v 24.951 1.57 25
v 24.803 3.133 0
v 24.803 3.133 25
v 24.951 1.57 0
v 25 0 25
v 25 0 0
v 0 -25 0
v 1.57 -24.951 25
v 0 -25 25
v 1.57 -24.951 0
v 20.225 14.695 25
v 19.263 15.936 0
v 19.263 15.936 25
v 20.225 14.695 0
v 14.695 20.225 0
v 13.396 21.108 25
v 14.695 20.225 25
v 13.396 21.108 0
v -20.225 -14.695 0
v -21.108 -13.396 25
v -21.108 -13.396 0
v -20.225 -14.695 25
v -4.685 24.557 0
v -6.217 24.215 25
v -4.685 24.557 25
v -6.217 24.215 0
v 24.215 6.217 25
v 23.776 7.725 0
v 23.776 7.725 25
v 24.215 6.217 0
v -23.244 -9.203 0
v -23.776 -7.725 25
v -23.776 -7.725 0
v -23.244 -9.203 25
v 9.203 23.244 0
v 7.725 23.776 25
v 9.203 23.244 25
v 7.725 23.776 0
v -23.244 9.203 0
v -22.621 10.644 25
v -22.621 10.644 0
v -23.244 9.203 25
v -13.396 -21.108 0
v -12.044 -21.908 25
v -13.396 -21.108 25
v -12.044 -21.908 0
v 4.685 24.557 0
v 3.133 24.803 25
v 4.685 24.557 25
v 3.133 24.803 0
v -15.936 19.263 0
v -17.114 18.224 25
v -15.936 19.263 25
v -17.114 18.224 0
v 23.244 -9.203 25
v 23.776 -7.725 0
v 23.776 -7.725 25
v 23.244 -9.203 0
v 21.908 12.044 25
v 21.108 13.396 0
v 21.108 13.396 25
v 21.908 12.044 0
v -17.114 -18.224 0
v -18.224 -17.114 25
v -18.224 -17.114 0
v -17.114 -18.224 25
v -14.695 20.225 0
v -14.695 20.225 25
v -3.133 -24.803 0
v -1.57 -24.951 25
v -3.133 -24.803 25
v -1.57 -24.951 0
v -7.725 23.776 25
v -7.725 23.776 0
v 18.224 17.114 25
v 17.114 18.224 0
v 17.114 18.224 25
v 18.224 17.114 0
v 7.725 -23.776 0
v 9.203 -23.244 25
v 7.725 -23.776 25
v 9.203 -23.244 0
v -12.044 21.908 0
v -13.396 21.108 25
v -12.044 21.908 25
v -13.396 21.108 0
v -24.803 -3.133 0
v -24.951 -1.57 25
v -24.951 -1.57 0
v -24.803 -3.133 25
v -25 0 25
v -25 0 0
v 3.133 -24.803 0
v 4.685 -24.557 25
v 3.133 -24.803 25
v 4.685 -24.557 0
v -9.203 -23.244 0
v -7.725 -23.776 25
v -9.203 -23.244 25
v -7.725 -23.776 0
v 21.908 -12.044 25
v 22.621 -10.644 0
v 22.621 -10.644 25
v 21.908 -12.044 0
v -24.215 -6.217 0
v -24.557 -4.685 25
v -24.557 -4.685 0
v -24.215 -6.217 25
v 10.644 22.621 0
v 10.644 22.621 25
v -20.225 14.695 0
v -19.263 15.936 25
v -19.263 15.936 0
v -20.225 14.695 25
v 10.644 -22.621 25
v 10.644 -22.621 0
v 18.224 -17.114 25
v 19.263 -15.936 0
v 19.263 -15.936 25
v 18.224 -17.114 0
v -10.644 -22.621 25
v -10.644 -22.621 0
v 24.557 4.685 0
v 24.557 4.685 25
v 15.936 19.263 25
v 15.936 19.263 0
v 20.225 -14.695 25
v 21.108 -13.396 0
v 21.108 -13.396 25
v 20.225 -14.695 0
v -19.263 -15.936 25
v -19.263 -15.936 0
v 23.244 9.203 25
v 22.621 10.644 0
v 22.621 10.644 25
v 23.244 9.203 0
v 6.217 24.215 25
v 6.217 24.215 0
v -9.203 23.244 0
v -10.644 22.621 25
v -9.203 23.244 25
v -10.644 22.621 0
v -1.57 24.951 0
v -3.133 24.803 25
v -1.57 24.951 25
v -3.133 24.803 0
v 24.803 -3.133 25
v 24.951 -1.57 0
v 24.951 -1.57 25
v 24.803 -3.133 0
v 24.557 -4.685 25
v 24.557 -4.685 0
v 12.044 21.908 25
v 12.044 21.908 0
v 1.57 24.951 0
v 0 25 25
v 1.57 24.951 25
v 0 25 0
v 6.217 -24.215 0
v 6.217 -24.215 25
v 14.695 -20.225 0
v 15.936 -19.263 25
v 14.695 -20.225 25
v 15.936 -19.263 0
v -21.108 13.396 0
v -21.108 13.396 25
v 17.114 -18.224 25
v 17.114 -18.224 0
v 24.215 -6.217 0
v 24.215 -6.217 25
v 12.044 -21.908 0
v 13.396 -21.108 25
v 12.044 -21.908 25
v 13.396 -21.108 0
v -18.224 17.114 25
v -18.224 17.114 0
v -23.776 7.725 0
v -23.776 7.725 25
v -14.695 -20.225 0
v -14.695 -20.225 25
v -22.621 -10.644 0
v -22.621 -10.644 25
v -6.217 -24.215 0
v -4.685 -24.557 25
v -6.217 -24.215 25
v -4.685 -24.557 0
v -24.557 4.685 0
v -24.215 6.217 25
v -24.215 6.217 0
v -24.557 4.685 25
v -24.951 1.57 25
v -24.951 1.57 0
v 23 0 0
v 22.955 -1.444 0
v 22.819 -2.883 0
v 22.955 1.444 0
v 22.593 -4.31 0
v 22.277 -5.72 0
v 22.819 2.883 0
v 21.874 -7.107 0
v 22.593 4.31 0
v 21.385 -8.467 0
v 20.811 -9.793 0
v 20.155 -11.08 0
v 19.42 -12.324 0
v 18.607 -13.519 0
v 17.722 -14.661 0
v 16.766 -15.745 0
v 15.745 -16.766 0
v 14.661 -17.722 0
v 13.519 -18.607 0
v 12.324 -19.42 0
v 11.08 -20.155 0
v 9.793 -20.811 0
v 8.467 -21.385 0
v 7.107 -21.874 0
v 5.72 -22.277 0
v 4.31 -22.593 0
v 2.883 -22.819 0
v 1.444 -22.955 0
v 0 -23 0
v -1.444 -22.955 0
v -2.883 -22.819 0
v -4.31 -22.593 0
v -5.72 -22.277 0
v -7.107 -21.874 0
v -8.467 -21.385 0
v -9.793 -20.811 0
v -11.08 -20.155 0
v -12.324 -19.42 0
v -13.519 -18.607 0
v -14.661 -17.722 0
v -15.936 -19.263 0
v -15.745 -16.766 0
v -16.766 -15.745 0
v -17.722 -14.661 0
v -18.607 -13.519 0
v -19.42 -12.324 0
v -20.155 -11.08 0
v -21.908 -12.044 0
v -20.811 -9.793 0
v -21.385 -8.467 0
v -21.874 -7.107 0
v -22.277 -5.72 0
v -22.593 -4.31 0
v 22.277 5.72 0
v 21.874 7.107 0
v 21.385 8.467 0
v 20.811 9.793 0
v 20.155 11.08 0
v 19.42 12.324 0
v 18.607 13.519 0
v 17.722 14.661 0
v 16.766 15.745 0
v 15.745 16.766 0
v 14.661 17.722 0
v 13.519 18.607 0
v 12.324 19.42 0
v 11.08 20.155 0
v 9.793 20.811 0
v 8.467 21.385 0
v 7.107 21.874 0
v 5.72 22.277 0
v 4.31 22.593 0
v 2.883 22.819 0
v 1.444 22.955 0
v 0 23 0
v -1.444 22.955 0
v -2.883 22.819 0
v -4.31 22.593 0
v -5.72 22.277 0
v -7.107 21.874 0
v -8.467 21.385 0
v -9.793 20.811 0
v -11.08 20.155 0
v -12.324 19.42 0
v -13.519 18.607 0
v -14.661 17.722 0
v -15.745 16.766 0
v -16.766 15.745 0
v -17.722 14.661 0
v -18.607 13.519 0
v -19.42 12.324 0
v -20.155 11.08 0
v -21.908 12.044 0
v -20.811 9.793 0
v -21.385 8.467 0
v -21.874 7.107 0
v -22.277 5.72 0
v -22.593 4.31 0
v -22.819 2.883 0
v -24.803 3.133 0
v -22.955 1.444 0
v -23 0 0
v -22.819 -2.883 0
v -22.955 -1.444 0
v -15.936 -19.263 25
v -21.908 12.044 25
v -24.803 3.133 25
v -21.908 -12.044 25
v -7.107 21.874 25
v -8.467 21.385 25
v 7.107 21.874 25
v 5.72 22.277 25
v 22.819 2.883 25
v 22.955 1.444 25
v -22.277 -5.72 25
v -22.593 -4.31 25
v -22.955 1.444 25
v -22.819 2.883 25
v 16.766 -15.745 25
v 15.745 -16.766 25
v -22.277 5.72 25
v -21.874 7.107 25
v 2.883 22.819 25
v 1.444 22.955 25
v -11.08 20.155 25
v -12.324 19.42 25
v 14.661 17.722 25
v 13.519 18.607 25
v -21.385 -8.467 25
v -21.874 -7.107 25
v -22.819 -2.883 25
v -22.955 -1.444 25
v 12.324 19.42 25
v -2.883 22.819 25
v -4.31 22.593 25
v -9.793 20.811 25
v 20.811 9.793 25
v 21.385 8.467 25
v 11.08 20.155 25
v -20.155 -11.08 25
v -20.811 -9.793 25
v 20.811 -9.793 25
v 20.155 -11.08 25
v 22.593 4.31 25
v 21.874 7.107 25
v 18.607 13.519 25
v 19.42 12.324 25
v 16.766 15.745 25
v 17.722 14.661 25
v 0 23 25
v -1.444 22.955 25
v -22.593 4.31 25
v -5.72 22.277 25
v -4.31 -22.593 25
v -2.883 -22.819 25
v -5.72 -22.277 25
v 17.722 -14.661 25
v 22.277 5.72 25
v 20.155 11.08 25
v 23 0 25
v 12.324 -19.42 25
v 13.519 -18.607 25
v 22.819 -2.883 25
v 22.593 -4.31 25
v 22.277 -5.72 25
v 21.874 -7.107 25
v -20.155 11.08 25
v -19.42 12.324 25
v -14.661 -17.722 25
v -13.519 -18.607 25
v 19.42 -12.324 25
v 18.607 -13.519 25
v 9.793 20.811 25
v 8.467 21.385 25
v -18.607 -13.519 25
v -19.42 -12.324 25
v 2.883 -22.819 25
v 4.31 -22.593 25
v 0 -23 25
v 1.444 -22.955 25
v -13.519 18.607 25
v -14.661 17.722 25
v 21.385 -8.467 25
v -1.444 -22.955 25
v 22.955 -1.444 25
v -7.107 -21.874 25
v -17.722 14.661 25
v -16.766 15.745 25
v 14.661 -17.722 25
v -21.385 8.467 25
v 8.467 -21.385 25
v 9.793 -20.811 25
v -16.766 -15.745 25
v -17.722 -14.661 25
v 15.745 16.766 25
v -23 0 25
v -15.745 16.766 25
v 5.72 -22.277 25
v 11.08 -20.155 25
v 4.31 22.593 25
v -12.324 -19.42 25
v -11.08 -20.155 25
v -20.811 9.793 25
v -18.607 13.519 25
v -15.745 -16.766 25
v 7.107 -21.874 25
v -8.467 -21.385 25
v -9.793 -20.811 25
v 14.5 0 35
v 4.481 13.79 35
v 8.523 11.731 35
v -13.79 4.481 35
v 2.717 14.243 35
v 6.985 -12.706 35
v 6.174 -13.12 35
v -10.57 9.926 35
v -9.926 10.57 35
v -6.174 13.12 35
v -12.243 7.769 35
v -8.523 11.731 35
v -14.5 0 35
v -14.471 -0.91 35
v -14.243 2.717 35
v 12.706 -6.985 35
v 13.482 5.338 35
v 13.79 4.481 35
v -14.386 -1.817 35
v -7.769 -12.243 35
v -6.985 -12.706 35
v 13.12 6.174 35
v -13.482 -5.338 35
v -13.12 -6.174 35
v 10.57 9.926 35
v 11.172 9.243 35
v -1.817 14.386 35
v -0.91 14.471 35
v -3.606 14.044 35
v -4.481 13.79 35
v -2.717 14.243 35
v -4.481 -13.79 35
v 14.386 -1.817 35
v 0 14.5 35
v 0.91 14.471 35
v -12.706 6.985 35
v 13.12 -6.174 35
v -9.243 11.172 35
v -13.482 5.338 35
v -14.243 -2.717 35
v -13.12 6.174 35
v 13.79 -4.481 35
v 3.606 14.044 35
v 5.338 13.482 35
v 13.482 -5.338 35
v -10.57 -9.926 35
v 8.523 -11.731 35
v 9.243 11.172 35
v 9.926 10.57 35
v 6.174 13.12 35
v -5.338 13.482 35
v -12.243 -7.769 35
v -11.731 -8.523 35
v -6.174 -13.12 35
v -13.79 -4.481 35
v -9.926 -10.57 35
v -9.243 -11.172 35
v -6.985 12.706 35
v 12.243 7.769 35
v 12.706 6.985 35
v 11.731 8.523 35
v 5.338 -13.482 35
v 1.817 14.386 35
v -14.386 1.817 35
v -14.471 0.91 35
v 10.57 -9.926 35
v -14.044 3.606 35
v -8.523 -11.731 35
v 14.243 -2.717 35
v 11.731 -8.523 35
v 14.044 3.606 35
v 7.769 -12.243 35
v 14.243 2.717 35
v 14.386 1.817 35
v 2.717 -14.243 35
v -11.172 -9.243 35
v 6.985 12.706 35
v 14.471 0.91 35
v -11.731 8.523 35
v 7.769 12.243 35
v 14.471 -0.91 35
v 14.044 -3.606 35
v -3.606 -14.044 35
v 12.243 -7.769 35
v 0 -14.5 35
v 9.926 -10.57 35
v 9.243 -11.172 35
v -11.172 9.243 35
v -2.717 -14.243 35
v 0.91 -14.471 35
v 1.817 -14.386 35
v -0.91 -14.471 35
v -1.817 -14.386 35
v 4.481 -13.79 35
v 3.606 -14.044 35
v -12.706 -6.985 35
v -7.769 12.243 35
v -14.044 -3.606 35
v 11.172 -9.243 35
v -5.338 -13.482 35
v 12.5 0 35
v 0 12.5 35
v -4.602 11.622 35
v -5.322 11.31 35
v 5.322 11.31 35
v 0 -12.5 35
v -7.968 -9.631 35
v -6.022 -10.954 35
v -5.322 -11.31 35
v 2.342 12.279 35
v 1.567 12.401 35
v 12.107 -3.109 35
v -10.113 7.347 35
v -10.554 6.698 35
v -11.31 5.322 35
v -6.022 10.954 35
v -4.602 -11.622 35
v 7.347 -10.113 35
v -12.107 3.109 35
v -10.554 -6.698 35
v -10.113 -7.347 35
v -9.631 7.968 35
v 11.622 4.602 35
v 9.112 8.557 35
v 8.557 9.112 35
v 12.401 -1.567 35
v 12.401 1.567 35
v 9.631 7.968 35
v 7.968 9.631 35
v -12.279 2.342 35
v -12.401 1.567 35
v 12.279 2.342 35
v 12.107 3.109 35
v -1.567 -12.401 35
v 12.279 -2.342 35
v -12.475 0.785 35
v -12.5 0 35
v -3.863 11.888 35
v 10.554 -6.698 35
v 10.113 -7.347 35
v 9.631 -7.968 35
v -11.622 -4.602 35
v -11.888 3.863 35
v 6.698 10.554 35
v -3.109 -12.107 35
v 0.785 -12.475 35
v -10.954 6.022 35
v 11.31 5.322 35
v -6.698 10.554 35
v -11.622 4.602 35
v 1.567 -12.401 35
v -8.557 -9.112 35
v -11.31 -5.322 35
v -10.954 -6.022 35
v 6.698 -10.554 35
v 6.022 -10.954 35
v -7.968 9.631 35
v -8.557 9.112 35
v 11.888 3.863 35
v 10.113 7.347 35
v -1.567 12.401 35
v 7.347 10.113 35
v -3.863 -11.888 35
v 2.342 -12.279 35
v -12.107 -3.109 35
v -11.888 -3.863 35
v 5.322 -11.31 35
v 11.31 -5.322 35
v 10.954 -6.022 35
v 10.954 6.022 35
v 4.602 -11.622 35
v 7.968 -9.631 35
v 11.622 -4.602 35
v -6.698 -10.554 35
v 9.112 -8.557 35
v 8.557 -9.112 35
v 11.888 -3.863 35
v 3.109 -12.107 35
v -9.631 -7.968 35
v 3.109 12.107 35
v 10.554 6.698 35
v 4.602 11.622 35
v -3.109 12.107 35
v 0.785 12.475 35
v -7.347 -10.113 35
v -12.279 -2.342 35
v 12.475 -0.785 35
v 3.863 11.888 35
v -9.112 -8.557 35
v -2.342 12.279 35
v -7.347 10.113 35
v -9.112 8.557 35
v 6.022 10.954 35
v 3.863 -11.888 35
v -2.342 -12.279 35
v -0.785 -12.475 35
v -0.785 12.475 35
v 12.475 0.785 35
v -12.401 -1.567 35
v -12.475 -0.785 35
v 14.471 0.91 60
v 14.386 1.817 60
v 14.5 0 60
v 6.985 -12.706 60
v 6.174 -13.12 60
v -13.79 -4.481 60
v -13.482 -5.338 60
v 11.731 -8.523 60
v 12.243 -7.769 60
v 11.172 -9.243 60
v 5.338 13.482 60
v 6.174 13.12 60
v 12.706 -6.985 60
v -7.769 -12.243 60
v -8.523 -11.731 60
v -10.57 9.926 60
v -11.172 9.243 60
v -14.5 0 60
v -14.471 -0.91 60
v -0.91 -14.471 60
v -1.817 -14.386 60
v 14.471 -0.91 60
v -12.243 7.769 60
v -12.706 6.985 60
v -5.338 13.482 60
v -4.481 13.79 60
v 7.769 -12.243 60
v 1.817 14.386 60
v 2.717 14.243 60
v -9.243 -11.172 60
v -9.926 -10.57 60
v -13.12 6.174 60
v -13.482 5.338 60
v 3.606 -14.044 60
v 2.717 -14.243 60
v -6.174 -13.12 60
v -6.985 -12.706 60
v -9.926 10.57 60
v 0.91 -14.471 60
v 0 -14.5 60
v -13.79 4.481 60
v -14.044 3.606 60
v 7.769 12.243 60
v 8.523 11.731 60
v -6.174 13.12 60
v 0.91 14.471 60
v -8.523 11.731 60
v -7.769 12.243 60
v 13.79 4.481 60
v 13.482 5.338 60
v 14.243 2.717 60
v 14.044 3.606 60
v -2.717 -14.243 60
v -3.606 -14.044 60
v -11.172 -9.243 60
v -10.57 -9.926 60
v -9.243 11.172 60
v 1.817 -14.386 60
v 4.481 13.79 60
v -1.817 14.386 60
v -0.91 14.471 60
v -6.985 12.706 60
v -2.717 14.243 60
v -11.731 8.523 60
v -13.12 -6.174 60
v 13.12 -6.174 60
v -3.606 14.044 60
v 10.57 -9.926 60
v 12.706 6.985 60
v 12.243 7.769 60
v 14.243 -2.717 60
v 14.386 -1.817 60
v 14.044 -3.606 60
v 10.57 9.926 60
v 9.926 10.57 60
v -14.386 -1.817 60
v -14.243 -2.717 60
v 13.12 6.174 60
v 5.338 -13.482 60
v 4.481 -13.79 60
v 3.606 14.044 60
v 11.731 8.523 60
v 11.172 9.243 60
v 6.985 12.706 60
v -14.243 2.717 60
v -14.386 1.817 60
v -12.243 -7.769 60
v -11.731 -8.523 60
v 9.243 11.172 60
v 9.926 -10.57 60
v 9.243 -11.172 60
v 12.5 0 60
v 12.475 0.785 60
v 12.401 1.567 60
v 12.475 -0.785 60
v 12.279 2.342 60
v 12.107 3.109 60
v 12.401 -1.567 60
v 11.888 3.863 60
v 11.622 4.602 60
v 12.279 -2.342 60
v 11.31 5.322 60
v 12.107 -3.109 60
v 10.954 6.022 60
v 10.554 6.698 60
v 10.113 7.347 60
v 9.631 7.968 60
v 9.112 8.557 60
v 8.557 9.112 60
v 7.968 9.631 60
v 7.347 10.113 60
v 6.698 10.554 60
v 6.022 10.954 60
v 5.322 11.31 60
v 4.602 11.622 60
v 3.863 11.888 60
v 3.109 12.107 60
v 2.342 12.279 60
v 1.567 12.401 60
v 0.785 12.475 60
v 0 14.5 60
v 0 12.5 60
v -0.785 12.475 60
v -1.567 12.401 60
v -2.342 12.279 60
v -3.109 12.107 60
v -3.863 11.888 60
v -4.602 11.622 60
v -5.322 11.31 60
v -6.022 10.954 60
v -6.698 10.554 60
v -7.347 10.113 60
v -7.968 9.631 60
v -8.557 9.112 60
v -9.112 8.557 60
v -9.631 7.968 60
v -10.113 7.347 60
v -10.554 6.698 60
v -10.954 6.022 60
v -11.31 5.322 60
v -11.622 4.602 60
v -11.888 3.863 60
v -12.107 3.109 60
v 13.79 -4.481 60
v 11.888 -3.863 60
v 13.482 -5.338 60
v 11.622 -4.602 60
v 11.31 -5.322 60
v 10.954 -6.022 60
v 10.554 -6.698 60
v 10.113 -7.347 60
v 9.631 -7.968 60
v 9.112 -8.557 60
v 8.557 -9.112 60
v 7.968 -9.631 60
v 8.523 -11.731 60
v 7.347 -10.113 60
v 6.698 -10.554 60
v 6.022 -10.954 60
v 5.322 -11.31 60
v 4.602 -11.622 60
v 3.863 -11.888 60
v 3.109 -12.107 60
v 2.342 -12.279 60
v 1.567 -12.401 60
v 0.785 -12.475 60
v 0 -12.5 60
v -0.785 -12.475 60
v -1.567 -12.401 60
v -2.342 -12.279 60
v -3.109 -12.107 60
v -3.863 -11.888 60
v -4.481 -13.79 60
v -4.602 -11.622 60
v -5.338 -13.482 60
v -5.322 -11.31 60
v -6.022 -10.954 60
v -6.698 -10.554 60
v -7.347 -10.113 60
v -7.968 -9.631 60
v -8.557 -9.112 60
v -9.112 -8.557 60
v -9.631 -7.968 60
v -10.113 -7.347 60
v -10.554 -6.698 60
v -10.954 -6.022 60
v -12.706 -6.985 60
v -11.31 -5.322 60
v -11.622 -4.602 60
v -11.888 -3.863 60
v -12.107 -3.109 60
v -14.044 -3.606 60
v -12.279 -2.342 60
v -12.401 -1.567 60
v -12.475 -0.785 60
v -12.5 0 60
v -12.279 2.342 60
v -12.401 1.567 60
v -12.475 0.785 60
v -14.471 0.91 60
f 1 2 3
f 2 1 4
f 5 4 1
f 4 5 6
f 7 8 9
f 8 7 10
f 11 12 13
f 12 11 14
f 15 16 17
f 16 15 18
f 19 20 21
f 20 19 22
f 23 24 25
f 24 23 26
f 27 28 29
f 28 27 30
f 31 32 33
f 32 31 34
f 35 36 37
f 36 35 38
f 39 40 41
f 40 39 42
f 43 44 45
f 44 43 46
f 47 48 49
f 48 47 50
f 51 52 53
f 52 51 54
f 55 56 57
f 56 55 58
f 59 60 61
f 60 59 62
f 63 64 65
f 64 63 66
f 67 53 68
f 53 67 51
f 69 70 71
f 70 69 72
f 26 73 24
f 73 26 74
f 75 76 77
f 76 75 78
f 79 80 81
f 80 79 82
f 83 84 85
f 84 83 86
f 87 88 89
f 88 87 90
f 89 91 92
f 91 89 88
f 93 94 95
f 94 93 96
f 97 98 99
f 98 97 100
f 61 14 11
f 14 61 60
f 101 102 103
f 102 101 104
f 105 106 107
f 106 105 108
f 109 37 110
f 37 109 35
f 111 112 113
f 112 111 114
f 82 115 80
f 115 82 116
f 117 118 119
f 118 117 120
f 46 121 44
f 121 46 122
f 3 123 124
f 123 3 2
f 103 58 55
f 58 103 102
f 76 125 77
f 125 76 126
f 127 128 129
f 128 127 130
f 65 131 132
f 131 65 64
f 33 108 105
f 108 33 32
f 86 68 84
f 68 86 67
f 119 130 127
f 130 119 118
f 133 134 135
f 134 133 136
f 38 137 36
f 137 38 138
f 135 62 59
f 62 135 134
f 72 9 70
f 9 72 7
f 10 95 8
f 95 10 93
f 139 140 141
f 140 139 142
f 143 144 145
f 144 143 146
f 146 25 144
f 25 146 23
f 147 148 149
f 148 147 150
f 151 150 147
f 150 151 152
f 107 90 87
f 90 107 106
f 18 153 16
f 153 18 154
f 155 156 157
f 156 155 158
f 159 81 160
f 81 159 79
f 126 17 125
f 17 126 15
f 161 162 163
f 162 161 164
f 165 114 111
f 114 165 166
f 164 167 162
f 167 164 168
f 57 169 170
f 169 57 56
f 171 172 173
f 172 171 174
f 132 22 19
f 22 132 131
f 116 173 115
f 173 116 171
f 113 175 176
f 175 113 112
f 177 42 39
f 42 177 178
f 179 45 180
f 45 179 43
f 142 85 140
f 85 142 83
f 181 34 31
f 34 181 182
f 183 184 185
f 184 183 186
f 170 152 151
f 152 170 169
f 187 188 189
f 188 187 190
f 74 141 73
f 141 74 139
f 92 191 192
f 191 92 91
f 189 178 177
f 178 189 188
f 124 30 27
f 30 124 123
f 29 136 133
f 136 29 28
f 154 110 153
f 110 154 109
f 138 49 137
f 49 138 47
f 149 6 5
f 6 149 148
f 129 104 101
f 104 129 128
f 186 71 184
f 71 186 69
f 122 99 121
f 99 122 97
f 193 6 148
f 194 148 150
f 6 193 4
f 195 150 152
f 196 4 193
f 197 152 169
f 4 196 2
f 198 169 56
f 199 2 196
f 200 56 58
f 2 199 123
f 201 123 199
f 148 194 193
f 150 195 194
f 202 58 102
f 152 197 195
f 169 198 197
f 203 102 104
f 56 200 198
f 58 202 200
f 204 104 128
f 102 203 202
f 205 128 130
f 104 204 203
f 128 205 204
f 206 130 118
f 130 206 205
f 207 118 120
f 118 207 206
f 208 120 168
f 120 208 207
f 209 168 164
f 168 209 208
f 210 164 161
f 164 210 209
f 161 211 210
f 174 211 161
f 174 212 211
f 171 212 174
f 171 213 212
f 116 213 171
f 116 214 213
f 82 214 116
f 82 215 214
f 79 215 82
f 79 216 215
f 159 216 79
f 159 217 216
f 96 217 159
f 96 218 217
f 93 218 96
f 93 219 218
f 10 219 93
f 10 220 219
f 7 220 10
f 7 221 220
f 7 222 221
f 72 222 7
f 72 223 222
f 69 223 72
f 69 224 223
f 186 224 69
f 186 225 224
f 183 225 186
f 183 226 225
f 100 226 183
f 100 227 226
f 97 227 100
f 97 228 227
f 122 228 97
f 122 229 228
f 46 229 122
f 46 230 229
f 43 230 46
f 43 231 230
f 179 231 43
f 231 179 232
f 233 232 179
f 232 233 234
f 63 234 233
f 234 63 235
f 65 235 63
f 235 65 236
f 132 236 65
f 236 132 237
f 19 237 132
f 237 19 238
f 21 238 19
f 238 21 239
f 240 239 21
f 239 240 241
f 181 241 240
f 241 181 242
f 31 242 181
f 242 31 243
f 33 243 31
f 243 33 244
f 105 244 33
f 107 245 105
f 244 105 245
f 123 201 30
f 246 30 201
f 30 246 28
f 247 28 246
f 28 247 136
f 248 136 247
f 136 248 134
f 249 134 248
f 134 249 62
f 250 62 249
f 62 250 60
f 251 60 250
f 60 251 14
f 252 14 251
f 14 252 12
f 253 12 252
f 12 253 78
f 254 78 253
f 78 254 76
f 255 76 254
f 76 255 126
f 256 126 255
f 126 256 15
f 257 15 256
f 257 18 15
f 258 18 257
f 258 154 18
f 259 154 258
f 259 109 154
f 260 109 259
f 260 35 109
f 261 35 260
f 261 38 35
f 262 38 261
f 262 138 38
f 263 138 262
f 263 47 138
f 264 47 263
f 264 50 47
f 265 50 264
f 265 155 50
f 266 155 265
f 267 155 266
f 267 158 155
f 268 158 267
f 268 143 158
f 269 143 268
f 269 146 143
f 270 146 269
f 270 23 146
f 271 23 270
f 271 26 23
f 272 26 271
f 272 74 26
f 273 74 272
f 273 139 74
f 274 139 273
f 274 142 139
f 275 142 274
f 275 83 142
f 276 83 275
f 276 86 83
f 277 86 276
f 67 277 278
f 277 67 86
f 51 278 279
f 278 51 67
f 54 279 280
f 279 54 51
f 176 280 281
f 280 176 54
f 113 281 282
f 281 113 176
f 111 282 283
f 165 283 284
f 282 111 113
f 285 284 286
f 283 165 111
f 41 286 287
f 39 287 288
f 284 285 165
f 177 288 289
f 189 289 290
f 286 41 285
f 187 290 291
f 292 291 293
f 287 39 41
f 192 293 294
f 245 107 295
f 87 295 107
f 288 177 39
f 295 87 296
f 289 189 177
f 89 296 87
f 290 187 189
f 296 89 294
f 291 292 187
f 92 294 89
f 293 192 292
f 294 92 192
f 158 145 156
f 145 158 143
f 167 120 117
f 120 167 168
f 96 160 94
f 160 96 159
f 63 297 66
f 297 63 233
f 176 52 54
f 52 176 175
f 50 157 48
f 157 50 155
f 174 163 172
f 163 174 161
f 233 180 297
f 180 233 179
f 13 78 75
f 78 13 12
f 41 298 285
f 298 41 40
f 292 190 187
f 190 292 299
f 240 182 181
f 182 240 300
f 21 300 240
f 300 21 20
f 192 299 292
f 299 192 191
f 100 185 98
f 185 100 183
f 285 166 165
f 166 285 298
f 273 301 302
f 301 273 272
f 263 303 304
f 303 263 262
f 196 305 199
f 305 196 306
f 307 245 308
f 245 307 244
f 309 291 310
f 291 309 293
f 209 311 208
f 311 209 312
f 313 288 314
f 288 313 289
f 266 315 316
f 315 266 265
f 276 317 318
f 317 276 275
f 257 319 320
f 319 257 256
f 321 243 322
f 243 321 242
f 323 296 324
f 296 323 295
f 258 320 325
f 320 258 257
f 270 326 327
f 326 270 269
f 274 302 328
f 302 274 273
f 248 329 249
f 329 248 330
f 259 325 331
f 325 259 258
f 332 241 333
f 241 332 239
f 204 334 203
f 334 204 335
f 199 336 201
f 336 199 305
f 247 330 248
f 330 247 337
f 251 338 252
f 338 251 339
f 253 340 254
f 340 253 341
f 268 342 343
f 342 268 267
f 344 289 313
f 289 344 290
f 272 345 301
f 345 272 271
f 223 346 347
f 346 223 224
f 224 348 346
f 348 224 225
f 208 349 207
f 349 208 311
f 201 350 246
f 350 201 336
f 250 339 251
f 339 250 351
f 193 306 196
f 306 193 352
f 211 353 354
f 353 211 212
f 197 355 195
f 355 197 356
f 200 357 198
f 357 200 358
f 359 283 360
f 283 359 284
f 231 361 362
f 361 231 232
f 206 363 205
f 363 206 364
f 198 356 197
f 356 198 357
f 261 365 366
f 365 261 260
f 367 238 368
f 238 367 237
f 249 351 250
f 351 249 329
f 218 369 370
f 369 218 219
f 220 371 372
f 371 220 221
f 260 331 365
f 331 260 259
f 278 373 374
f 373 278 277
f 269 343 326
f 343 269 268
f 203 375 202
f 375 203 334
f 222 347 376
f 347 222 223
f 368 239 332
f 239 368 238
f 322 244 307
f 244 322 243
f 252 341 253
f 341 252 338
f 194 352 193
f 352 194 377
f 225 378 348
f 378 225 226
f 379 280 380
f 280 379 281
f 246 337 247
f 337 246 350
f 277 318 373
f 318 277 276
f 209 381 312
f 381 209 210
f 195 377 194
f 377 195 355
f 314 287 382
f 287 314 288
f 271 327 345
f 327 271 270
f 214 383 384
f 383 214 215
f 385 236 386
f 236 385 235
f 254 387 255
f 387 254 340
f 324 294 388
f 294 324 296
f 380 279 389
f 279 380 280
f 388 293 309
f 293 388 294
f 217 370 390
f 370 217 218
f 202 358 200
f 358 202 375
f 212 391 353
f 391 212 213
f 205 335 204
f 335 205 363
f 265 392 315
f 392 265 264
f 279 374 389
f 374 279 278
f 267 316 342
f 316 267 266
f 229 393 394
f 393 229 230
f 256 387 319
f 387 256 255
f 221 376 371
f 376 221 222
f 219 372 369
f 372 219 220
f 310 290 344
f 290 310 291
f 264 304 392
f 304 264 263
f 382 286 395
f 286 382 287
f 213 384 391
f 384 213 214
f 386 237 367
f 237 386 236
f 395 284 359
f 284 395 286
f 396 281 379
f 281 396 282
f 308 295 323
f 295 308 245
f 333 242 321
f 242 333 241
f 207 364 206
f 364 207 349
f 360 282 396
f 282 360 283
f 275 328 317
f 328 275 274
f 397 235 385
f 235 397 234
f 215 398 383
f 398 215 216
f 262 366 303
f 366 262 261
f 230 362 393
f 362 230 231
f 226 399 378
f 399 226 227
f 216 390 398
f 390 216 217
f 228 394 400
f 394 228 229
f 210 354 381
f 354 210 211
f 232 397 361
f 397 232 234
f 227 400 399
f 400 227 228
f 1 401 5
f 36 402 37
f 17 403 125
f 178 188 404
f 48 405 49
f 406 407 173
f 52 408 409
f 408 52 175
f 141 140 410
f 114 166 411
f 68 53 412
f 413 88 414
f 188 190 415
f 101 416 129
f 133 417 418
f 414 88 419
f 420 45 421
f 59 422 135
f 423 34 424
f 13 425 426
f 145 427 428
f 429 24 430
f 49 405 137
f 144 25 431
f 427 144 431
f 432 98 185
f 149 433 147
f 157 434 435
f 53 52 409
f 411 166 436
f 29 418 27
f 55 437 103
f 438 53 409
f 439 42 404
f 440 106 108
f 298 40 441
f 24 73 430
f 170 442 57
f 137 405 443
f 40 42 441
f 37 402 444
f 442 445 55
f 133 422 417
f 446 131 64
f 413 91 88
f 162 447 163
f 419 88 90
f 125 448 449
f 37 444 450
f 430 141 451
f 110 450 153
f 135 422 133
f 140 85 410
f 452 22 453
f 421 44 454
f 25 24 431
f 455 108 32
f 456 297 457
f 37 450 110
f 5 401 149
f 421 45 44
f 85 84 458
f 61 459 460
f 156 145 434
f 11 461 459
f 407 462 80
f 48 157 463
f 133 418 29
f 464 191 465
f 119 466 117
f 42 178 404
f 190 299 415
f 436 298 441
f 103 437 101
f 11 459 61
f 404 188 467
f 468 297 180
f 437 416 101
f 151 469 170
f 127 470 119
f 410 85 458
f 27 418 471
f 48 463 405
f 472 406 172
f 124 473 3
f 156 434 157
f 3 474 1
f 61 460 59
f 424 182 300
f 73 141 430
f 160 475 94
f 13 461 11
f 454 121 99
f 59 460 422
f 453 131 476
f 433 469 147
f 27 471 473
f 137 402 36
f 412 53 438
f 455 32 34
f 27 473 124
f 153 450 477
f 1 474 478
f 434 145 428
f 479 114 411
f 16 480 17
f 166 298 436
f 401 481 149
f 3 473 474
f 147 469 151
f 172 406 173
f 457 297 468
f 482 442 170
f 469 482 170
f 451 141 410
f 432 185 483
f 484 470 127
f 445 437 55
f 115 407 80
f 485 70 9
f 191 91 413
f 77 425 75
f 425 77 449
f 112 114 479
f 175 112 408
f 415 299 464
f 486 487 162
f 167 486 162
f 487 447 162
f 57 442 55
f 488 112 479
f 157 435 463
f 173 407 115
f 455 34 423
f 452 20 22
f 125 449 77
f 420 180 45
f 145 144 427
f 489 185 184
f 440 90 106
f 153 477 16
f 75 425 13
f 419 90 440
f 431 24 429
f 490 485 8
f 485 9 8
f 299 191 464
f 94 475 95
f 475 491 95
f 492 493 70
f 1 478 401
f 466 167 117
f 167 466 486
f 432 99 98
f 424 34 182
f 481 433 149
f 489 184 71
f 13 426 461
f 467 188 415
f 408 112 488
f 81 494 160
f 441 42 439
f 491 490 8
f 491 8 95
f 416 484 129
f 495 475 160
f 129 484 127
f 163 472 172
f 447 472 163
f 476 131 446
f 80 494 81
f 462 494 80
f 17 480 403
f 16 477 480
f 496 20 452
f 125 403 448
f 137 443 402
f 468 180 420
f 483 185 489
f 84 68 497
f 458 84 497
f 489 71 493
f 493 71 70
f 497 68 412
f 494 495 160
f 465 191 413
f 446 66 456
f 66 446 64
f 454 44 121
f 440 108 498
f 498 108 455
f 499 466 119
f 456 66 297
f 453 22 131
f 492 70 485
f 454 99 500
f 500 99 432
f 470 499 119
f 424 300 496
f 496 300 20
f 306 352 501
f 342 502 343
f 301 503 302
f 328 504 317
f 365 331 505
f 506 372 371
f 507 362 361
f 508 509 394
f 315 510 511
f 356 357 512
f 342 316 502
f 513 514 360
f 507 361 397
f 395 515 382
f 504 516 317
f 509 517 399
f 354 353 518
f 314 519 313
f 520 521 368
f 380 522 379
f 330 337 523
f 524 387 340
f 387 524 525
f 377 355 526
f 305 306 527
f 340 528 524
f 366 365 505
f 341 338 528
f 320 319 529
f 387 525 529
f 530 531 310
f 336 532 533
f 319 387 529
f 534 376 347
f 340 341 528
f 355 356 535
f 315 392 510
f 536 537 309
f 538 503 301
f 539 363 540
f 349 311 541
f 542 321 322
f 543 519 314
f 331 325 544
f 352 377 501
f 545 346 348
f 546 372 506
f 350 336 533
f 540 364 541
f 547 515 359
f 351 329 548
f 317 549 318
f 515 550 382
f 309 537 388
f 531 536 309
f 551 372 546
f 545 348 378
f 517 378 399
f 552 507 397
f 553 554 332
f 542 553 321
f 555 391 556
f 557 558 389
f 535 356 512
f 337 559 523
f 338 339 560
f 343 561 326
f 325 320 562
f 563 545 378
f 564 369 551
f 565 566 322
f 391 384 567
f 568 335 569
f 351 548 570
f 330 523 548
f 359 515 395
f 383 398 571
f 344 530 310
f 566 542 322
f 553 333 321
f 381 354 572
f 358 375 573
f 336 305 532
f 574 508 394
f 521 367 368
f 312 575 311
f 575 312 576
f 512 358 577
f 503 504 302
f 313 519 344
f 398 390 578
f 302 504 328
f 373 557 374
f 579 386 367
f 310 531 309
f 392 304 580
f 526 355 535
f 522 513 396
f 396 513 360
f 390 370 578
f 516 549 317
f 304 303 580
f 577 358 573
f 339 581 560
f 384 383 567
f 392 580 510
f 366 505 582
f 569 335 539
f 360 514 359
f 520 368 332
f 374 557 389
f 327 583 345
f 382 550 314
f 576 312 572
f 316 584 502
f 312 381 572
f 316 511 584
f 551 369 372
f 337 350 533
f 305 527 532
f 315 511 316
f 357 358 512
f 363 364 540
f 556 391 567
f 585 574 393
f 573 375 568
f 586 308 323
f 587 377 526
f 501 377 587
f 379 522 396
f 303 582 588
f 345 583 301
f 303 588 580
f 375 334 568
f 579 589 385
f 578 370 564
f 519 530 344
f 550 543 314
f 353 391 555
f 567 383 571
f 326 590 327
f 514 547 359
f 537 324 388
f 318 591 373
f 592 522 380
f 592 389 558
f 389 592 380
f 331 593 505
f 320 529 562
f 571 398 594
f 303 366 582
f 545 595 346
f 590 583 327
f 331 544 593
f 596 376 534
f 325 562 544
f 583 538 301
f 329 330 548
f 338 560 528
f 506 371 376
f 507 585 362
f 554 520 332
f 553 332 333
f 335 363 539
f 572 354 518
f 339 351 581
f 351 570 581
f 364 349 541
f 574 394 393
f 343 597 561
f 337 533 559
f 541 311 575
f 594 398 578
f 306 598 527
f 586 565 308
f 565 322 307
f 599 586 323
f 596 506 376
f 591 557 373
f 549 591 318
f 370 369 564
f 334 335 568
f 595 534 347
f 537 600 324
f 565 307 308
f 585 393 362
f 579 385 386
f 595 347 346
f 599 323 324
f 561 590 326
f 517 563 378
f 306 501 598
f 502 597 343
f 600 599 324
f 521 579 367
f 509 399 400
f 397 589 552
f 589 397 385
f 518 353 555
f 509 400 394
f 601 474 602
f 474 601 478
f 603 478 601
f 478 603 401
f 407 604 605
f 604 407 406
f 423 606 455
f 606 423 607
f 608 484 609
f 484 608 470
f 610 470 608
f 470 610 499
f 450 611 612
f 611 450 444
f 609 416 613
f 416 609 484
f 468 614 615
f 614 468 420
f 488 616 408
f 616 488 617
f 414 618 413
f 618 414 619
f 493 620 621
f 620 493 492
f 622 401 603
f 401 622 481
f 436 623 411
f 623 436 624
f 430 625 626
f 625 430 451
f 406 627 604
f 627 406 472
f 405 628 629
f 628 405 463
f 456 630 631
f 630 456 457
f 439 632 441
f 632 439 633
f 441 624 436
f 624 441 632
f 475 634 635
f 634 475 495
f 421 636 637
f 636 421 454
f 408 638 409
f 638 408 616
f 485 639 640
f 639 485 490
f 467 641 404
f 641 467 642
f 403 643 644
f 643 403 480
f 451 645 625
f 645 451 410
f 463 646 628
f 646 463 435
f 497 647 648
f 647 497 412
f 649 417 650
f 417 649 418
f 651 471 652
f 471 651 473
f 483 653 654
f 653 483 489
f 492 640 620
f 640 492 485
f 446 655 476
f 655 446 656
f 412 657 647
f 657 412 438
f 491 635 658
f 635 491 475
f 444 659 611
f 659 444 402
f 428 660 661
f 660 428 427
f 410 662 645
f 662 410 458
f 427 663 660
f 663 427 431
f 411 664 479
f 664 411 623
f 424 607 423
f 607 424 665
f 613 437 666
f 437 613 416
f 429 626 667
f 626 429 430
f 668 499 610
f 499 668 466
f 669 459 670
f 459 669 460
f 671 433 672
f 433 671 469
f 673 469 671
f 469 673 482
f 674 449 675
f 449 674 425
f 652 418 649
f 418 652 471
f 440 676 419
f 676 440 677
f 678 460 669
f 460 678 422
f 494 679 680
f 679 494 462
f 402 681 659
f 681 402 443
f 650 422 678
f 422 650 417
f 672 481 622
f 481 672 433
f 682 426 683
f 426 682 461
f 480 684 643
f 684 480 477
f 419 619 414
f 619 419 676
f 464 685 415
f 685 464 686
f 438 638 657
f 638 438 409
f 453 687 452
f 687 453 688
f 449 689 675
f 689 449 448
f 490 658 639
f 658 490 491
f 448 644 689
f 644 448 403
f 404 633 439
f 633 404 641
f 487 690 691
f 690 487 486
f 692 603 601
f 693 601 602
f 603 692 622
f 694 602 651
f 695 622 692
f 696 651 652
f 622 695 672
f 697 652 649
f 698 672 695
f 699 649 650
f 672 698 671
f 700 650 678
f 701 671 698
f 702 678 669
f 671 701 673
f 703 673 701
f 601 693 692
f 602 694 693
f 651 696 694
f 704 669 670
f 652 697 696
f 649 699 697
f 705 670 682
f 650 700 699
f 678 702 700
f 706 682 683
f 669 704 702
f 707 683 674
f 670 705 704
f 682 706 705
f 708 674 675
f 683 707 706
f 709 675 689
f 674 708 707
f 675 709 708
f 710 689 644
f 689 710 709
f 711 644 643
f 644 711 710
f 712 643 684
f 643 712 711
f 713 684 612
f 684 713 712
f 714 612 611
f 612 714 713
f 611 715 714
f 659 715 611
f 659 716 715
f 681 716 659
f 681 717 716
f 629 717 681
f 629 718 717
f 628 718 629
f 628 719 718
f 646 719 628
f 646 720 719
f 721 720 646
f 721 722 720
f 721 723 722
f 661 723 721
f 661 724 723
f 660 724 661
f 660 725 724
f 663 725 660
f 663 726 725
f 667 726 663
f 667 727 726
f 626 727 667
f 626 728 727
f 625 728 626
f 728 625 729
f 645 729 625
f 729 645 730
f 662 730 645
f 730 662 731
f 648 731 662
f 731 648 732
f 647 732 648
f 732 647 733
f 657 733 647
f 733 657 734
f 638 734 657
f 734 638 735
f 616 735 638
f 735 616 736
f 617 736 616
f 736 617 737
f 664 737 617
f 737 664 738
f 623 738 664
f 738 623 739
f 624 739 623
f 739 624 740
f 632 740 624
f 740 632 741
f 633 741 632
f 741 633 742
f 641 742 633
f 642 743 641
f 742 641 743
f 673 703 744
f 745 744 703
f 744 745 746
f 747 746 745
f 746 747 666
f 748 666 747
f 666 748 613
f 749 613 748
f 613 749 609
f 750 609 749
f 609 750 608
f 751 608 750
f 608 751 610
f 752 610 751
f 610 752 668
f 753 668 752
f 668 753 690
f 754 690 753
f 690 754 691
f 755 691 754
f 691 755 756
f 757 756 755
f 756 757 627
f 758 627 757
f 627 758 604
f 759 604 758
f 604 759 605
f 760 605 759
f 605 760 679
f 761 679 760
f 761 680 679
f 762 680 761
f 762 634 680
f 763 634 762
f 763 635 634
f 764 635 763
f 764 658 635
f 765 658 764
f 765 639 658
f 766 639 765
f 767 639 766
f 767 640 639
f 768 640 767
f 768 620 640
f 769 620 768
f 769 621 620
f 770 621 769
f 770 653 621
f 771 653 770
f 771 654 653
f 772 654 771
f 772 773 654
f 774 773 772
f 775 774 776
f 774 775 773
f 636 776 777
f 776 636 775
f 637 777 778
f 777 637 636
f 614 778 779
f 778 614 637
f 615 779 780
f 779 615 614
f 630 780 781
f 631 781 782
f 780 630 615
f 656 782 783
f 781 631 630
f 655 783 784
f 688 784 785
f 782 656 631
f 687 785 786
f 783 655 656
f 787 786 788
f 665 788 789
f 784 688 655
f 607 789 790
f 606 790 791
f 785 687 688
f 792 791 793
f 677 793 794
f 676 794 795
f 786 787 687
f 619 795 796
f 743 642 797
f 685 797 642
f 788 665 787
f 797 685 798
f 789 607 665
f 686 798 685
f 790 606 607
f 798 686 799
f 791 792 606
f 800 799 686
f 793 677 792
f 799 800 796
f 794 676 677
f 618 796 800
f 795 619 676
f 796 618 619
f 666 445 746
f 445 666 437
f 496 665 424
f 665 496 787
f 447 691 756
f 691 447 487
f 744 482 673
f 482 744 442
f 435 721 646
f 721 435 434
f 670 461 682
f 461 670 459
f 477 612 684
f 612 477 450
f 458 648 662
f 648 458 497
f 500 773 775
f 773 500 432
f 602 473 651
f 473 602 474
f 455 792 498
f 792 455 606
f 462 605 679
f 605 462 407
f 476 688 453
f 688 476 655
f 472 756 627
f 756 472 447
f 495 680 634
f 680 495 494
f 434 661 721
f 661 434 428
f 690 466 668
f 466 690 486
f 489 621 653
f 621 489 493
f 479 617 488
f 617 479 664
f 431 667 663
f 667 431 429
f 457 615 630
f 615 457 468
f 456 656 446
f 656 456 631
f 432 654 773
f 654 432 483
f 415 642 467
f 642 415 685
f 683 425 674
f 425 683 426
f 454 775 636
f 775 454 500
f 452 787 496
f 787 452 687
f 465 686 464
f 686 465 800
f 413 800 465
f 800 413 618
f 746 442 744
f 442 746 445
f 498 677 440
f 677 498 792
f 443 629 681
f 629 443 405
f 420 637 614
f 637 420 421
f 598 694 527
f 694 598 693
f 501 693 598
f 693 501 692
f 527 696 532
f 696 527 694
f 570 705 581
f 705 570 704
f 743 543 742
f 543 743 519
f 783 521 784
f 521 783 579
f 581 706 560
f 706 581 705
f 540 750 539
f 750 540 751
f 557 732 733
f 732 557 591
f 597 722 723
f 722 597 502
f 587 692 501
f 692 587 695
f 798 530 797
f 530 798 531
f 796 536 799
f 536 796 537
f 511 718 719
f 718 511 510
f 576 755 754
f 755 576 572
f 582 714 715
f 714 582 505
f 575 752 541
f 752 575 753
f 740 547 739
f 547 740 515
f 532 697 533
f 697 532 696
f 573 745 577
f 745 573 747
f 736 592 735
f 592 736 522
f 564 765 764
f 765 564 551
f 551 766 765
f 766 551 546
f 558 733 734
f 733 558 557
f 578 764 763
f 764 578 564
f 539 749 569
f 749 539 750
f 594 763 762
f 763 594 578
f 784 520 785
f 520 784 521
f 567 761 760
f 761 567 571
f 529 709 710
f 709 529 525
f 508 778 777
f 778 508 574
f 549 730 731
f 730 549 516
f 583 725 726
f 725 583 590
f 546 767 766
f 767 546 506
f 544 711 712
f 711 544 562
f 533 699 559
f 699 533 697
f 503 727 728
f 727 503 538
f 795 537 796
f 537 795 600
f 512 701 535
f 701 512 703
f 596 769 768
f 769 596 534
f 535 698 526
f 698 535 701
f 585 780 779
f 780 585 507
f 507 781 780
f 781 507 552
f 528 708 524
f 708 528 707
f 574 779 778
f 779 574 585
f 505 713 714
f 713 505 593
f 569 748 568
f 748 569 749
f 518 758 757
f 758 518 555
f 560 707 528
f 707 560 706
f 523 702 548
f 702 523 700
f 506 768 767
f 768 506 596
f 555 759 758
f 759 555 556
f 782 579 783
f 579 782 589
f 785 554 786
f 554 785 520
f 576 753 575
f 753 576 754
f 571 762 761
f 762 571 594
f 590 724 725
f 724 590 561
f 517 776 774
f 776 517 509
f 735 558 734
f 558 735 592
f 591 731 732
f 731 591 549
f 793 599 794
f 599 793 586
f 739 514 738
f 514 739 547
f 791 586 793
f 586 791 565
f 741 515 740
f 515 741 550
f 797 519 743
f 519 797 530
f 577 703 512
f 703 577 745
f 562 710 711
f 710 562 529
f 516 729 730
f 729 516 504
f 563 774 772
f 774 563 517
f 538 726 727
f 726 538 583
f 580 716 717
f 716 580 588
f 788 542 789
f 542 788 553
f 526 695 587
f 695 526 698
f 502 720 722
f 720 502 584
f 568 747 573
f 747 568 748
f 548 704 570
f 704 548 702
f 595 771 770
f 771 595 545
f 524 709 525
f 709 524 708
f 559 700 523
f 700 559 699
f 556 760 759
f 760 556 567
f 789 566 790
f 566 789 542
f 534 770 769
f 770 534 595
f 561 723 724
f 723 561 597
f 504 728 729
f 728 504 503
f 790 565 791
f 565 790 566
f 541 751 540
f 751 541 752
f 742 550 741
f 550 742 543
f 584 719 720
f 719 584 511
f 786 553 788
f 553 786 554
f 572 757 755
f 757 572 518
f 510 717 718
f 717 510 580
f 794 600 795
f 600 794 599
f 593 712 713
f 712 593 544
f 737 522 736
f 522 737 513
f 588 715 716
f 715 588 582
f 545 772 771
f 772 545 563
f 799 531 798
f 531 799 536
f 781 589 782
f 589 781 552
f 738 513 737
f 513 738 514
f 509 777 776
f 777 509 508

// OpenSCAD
wall_thickness = 2;
bigger_outer_radius = 25;
bigger_height = 25;
smaller_outer_radius = 14.5;
smaller_height = 25;
transition_height = 10;
$fn = 100;


difference() {
    cylinder(bigger_height, bigger_outer_radius, bigger_outer_radius);
    cylinder(bigger_height, bigger_outer_radius - wall_thickness, bigger_outer_radius - wall_thickness);
}

translate([0, 0, bigger_height])
difference() {
    cylinder(transition_height, bigger_outer_radius, smaller_outer_radius);
    cylinder(transition_height, bigger_outer_radius - wall_thickness, smaller_outer_radius - wall_thickness);
}

translate([0, 0, bigger_height+transition_height])
difference() {
    cylinder(smaller_height, smaller_outer_radius, smaller_outer_radius);
    cylinder(smaller_height, smaller_outer_radius - wall_thickness, smaller_outer_radius - wall_thickness);
}
